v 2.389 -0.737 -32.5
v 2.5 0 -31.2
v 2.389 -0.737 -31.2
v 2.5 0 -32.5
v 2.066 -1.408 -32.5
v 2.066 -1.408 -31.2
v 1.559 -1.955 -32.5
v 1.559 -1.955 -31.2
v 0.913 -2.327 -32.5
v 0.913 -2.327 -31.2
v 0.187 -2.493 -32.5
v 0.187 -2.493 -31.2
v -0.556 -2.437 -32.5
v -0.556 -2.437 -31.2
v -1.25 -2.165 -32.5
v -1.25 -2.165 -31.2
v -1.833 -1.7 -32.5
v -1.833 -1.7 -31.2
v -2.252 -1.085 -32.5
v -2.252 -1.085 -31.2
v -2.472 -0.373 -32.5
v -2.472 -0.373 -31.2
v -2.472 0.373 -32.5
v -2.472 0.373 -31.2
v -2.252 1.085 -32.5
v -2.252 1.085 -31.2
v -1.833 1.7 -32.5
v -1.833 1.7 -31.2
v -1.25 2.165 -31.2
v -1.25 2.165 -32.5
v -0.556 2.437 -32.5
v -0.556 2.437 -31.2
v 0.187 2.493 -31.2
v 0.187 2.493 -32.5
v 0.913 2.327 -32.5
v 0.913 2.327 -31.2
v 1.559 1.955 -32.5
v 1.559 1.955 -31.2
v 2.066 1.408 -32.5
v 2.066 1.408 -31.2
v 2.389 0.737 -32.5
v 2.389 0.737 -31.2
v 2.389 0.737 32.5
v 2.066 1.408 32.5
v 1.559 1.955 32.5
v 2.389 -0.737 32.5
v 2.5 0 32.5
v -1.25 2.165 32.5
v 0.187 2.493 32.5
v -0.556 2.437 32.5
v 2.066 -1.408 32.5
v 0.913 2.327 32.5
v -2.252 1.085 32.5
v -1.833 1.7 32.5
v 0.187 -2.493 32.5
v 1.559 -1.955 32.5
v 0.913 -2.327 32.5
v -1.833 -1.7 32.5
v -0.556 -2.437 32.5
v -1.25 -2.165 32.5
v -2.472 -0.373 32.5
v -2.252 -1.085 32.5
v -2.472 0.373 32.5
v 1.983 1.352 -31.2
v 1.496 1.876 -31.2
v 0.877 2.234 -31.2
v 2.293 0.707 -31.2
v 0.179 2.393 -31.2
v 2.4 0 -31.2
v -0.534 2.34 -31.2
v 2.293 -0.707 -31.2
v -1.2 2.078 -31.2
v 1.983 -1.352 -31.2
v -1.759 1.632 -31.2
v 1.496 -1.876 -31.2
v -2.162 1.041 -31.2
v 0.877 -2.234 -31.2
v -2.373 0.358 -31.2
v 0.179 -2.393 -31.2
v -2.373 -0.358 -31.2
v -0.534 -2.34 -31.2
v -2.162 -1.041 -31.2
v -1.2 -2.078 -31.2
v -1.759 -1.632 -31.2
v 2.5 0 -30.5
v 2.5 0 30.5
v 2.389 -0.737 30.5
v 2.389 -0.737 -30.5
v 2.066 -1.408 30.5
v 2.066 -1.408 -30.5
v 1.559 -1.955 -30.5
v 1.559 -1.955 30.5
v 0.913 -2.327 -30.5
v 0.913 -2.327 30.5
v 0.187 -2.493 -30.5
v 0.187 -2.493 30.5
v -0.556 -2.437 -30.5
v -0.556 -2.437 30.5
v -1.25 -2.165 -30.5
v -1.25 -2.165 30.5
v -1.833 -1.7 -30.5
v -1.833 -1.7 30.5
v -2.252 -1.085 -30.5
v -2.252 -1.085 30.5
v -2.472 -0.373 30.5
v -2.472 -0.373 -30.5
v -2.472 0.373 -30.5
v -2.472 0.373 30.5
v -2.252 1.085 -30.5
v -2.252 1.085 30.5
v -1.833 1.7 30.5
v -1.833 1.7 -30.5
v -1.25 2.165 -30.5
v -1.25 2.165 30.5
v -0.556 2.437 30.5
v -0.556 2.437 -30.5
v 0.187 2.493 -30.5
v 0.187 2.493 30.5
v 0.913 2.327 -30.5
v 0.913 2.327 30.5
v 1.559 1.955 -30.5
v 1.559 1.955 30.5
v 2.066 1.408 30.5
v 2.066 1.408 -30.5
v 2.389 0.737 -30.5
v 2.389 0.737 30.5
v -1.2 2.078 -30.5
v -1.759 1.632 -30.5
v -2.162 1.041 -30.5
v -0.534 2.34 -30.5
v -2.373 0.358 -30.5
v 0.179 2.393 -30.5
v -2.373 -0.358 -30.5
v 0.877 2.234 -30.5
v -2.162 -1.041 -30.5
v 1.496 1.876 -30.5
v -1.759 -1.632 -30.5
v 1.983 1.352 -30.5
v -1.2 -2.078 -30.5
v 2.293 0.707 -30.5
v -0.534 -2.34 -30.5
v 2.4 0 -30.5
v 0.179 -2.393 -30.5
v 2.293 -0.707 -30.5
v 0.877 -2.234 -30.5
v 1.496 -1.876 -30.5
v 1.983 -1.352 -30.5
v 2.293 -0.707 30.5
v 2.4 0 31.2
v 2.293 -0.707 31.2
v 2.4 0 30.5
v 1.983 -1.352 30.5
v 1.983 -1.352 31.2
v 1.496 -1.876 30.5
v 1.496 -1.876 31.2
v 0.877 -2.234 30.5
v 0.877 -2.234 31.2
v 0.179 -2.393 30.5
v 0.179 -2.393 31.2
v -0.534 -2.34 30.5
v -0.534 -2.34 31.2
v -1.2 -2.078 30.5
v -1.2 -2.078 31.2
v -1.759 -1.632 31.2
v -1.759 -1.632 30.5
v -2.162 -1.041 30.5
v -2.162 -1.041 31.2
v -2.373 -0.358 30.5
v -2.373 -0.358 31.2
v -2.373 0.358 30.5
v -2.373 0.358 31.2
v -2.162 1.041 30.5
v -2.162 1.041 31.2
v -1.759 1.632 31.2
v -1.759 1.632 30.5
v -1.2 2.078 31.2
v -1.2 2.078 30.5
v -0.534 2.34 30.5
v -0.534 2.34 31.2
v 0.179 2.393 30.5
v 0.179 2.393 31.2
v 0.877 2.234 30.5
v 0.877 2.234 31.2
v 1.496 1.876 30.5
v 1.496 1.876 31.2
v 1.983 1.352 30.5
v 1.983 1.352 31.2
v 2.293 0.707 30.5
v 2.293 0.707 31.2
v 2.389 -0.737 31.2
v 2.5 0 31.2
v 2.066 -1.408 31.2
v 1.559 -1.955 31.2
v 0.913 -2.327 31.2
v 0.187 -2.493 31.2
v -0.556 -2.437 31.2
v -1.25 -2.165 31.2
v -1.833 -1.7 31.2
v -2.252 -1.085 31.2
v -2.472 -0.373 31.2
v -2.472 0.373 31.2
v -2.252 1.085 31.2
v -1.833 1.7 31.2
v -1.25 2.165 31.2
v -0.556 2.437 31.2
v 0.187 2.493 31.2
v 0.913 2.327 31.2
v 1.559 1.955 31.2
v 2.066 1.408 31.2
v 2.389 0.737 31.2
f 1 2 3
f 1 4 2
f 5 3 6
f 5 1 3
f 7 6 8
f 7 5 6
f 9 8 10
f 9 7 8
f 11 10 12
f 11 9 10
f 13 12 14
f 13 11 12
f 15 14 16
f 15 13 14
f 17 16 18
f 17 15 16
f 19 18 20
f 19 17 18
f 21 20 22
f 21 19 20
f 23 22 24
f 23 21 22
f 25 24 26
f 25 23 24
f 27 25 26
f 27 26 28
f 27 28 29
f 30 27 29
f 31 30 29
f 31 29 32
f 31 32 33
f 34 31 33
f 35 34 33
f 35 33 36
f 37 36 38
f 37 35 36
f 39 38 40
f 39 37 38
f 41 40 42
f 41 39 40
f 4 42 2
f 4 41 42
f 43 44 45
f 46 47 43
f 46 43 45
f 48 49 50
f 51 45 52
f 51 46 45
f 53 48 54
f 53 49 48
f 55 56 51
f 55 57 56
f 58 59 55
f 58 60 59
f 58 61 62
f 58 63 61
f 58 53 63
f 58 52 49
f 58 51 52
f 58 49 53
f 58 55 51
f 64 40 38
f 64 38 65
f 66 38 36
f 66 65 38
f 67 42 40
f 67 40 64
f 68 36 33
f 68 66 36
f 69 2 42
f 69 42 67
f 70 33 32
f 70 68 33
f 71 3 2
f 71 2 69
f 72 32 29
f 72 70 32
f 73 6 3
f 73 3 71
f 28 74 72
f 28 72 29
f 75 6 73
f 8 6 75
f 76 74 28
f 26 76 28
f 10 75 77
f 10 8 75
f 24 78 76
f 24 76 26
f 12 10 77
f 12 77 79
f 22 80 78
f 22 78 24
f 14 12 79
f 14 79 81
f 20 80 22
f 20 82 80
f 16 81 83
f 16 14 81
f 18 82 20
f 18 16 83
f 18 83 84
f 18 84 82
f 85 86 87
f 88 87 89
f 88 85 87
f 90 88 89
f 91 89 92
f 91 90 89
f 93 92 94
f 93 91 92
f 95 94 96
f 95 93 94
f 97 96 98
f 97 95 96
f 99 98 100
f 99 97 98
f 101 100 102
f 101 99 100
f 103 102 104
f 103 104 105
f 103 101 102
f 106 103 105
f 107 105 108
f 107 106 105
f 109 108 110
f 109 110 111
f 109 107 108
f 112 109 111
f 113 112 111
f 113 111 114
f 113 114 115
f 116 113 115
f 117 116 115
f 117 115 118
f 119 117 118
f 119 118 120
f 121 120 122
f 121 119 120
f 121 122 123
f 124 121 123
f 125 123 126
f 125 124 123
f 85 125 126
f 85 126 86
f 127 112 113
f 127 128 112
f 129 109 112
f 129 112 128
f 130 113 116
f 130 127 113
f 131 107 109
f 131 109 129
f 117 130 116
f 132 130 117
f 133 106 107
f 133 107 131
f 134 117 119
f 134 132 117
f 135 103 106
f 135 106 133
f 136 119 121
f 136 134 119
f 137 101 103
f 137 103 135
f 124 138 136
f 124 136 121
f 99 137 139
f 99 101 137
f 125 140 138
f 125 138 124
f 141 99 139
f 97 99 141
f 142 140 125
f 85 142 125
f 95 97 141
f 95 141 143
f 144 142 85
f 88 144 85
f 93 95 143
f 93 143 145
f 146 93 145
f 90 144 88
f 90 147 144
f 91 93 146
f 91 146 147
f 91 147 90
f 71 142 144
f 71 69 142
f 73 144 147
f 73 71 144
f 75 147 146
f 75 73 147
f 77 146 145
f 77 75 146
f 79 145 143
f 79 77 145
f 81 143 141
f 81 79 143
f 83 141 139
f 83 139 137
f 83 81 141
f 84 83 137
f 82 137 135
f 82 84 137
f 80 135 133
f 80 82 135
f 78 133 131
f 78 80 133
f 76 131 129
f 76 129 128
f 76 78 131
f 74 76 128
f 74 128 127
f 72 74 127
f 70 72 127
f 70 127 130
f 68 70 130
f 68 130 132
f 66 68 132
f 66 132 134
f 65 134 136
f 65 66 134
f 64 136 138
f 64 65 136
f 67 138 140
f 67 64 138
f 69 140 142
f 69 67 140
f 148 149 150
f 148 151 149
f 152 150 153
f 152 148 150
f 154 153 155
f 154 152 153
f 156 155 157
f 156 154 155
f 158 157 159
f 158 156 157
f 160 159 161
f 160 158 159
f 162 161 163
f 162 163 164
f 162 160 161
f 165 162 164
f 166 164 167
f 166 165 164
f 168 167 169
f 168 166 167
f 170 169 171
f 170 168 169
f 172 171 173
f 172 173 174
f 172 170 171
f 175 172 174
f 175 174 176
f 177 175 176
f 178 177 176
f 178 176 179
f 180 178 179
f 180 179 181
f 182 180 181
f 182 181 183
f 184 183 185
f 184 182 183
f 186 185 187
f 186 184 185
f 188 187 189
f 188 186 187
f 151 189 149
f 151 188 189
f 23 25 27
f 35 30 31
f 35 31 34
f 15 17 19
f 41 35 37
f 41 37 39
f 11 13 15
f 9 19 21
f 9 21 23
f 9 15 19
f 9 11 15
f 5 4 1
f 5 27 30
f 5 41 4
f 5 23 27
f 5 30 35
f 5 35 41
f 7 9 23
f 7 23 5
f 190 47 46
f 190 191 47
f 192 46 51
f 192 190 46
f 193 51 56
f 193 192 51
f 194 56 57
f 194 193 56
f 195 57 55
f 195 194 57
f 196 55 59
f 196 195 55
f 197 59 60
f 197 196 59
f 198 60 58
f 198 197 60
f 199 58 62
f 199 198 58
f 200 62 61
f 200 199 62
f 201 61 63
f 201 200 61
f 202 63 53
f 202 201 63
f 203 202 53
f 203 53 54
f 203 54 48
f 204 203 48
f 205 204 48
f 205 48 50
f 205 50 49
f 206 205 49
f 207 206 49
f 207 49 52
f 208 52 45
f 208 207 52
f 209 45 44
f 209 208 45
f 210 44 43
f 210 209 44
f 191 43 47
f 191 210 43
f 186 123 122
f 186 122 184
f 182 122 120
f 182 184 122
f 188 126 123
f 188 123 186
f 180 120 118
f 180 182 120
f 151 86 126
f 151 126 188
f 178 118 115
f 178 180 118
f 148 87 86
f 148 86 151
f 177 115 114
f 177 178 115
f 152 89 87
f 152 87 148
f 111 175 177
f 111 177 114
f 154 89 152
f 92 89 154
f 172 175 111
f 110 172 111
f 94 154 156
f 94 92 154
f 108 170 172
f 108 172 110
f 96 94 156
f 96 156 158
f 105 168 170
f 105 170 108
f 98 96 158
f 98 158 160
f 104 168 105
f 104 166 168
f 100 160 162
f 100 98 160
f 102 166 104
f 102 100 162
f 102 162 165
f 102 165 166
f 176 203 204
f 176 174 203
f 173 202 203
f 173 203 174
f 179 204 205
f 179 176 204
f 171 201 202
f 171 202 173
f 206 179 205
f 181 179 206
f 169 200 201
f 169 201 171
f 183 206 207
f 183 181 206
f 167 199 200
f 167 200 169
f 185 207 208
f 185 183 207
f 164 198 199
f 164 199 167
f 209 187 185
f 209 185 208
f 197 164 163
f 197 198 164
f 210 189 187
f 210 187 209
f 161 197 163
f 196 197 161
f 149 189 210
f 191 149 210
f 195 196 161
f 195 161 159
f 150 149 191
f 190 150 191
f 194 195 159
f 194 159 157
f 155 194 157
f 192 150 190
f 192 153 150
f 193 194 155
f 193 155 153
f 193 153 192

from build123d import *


with BuildPart() as part:
    # Szkic1 → Obrót1 (revolve)
    with BuildSketch(Plane(origin=(0, 0, 0), x_dir=(0, 0, -1), z_dir=(1, 0, 0)), mode=Mode.PRIVATE) as obr_t1_sk:
        Polygon((-31.2, -2.5), (-31.2, -2.4), (-30.5, -2.4), (-30.5, -2.5), (30.5, -2.5), (30.5, -2.4), (31.2, -2.4), (31.2, -2.5), (32.5, -2.5), (32.5, 0), (-32.5, 0), (-32.5, -2.5), align=None)
    revolve(obr_t1_sk.sketch.rotate(Axis((0, 0, 32.5), (0, 0, -1)), 270), axis=Axis((0, 0, 32.5), (0, 0, -1)))


solid = part.part
